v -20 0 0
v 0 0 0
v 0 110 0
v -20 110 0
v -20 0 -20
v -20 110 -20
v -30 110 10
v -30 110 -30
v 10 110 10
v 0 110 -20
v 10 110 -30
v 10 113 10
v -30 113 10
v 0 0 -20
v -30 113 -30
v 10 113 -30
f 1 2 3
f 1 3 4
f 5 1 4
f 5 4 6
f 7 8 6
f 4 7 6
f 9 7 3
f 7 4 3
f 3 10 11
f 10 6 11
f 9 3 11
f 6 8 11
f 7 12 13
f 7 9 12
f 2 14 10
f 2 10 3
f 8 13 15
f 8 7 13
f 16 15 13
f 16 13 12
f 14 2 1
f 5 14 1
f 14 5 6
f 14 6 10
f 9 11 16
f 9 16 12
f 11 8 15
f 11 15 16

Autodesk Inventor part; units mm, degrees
ref_plane "YZ Plane" through (0, 0, 0) normal (1, 0, 0) x (0, 1, 0)
ref_plane "XZ Plane" through (0, 0, 0) normal (0, 1, 0) x (-1, 0, 0)
ref_plane "XY Plane" through (0, 0, 0) normal (0, 0, 1) x (1, 0, 0)
sketch "Sketch1" plane through (0, 0, 0) normal (0, 1, 0) x (-1, 0, 0)
  line L0 (0, 0) -> (20, 0)
  line L1 (20, 0) -> (20, -20)
  line L2 (20, -20) -> (0, -20)
  line L3 (0, -20) -> (0, 0)
  dimension "d0" = 20
  dimension "d1" = 20
extrude "Extrusion1" add sketch "Sketch1" along normal blind 110
ref_plane "Work Plane1" through (-20, 110, -10) normal (0, 1, 0) x (1, 0, 0)
sketch "Sketch3" plane through (-20, 110, -10) normal (0, 1, 0) x (1, 0, 0)
  line L0 (0, -10) -> (20, -10) projected
  line L1 (20, -10) -> (20, 10) projected
  line L2 (30, -20) -> (-10, -20)
  line L3 (-10, -20) -> (-10, 20)
  line L4 (-10, 20) -> (30, 20)
  line L5 (30, 20) -> (30, -20)
  line L6 (30, -20) -> (-10, 20) construction
  line L7 (-10, -20) -> (30, 20) construction
  point P0 (10, 0)
  dimension "d4" = 10
  dimension "d5" = 10
  dimension "d6" = 40
  dimension "d7" = 40
extrude "Extrusion2" add sketch "Sketch3" along normal blind 3
properties part number "TagPillar"
